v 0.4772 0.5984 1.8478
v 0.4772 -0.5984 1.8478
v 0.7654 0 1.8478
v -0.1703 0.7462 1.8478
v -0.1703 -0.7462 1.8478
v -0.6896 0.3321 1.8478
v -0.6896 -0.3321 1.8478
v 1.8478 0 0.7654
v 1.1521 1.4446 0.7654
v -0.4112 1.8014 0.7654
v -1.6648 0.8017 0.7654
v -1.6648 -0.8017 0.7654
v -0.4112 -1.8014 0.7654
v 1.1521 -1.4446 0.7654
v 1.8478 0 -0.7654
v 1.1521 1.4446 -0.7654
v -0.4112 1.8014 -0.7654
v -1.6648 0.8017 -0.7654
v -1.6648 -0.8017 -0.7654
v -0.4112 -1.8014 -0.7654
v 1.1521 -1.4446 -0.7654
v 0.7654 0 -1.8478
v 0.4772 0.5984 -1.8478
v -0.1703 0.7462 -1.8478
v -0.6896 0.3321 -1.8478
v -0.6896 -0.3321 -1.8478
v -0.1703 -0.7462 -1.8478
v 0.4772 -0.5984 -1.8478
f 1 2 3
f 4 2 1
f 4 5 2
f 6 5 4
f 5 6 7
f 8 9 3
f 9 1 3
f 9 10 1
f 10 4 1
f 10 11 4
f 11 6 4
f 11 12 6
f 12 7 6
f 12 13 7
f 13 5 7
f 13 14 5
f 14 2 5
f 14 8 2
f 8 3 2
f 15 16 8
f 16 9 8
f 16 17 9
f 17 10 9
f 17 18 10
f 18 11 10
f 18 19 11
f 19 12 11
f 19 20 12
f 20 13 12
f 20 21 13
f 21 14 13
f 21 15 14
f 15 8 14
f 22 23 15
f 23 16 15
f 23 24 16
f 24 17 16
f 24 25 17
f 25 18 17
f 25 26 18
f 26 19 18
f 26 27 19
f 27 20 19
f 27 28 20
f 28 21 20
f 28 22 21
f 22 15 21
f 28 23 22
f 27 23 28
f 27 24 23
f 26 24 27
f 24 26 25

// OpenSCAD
/*
<json>
    {
        "Name": "HighKeyword in the second block is missing a comma after the entry!!!!!!",
        "Desc": "Use the slider to indicate how many columns printed acceptably.",
        "LowKeyword": "Lost",
        "HighKeyword": "Printed",
        "varBase": "PosPillarDiaV",
        "minDefault": 0.1,
        "maxDefault": 2,
        "minDefaultND": "0.5 * nozzleDiameter",
        "maxDefaultND": "5 * nozzleDiameter",
        "cameraData": "-2.28,2.59,6.06,59.9,0,13.8,113.4",
        "sortOrder": 0,
		"instanceCount": 10
    }
</json>
*/

sphere(d=4);

/*
<json>
    {
        "Name": "Item 2",
        "Desc": "Use the slider to indicate how many columns printed acceptably.",
        "LowKeyword": "Lost",
        "HighKeyword": "Printed"
        "varBase": "PosPillarDiaV",
        "minDefault": 0.1,
        "maxDefault": 2,
        "minDefaultND": "0.5 * nozzleDiameter",
        "maxDefaultND": "5 * nozzleDiameter",
        "cameraData": "-2.28,2.59,6.06,59.9,0,13.8,113.4",
        "sortOrder": 0,
		"instanceCount": 10
    }
</json>
*/
